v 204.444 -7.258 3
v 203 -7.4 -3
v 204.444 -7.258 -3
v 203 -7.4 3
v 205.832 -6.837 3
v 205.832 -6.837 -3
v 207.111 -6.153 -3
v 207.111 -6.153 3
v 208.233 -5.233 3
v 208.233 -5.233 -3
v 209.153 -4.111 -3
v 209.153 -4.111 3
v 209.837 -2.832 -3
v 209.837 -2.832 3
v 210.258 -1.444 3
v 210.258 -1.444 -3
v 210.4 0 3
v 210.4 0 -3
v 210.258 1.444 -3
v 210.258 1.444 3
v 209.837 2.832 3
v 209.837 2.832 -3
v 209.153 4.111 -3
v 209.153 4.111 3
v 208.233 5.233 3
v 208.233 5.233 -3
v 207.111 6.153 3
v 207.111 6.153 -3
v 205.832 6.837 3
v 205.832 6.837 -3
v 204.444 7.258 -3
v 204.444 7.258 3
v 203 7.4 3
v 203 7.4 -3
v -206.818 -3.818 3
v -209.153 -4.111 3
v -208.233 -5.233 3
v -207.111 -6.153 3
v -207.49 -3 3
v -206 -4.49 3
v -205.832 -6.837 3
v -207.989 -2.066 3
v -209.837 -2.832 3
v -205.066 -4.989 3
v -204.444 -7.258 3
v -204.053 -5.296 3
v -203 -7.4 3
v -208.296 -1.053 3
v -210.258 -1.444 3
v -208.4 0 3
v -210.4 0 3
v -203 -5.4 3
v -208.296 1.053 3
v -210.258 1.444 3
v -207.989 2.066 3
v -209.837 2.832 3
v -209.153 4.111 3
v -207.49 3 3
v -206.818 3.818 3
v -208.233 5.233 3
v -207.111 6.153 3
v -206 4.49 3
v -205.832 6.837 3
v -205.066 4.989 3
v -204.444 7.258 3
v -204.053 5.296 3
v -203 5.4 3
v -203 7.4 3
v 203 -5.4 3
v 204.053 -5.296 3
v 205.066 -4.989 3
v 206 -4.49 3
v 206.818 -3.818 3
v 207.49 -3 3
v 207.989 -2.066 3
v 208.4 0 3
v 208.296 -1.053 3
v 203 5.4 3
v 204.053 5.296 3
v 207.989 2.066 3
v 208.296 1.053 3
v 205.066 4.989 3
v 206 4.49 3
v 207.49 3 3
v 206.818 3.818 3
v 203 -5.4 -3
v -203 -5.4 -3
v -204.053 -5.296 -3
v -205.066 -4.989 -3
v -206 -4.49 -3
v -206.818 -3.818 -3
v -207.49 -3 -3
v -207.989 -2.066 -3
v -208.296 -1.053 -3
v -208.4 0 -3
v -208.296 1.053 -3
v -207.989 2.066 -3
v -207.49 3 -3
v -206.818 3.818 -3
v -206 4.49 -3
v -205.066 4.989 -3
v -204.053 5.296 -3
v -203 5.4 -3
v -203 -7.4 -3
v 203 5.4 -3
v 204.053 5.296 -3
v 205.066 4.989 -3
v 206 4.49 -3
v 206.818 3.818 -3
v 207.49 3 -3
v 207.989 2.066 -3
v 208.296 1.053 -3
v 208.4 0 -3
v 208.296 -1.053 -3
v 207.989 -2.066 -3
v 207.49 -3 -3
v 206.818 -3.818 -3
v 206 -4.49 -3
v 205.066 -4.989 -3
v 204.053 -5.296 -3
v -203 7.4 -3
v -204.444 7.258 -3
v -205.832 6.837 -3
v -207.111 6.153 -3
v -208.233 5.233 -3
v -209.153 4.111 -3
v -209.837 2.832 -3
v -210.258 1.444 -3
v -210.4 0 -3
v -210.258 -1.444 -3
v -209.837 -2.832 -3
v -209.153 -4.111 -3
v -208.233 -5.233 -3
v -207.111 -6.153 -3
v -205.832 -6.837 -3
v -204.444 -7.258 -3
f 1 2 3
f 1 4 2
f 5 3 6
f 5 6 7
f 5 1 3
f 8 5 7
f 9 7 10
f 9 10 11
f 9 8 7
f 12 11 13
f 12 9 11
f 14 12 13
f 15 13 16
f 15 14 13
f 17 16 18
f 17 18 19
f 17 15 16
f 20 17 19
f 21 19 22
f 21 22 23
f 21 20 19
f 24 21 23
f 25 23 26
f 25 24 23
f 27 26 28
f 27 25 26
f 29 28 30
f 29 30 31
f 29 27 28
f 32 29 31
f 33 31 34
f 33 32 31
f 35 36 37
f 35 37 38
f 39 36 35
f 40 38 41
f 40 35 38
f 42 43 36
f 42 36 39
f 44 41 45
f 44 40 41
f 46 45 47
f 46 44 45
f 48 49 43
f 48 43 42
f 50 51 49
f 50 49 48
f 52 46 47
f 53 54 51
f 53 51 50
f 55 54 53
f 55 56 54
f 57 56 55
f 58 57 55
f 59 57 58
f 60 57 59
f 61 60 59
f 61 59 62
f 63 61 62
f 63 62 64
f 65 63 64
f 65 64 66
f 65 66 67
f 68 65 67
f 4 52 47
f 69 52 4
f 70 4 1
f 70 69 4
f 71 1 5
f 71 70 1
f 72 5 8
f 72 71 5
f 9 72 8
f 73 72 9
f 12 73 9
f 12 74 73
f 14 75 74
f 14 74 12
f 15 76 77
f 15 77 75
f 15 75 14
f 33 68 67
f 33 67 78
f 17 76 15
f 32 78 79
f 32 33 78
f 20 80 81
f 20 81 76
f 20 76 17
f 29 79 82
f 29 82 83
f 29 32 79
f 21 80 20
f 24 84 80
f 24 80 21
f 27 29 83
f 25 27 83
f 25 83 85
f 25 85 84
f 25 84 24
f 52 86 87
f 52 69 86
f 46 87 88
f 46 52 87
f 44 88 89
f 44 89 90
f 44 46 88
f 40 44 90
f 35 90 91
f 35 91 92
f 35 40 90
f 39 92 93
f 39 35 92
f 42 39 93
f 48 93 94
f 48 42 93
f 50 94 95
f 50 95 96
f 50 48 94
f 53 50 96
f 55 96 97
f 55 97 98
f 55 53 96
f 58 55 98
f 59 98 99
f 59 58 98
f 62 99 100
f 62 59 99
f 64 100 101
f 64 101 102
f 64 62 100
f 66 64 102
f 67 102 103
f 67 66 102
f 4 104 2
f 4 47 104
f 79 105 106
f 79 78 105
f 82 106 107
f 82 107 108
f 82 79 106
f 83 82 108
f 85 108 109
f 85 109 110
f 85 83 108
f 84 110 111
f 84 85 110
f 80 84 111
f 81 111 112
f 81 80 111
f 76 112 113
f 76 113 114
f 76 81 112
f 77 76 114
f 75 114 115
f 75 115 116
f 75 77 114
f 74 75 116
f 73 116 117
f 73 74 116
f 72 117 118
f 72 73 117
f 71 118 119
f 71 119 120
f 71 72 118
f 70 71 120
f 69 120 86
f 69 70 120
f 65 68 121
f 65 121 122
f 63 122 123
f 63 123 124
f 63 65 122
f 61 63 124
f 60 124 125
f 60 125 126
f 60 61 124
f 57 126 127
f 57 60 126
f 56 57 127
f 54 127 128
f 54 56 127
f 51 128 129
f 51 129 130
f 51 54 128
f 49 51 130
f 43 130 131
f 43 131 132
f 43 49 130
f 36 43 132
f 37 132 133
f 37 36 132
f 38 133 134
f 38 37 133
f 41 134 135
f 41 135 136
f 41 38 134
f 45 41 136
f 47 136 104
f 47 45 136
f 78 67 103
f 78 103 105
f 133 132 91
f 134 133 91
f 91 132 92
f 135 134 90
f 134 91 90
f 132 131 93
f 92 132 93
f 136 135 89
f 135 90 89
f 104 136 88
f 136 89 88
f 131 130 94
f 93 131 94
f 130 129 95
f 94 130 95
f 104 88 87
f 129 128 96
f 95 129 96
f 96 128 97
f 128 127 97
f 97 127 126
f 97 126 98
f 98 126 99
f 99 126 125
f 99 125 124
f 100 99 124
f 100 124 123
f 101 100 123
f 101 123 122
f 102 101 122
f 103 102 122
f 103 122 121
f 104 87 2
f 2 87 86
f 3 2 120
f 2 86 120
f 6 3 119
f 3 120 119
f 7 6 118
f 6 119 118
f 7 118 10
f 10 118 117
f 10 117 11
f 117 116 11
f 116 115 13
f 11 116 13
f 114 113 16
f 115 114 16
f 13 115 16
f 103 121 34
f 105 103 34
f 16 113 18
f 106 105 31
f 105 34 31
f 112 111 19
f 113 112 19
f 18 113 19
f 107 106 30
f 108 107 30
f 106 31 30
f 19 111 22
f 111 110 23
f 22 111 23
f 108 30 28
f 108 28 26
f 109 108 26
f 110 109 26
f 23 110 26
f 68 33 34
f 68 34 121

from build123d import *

# Parameters (mm, degrees)
RESSALTO_EXTRUS_O1_DEPTH = 3


with BuildPart() as part:
    # Esboço1 → Ressalto-extrusão1 (new, symmetric)
    with BuildSketch(Plane.XY):
        with BuildLine():
            ThreePointArc((203, -7.4), (210.4, 0), (203, 7.4))
            Line((203, 7.4), (-203, 7.4))
            ThreePointArc((-203, 7.4), (-210.4, 0), (-203, -7.4))
            Line((-203, -7.4), (203, -7.4))
        make_face()
        with BuildLine():
            Line((-203, 5.4), (203, 5.4))
            ThreePointArc((203, 5.4), (208.4, 0), (203, -5.4))
            Line((203, -5.4), (-203, -5.4))
            ThreePointArc((-203, -5.4), (-208.4, 0), (-203, 5.4))
        make_face(mode=Mode.SUBTRACT)
    extrude(amount=RESSALTO_EXTRUS_O1_DEPTH, both=True)


solid = part.part
